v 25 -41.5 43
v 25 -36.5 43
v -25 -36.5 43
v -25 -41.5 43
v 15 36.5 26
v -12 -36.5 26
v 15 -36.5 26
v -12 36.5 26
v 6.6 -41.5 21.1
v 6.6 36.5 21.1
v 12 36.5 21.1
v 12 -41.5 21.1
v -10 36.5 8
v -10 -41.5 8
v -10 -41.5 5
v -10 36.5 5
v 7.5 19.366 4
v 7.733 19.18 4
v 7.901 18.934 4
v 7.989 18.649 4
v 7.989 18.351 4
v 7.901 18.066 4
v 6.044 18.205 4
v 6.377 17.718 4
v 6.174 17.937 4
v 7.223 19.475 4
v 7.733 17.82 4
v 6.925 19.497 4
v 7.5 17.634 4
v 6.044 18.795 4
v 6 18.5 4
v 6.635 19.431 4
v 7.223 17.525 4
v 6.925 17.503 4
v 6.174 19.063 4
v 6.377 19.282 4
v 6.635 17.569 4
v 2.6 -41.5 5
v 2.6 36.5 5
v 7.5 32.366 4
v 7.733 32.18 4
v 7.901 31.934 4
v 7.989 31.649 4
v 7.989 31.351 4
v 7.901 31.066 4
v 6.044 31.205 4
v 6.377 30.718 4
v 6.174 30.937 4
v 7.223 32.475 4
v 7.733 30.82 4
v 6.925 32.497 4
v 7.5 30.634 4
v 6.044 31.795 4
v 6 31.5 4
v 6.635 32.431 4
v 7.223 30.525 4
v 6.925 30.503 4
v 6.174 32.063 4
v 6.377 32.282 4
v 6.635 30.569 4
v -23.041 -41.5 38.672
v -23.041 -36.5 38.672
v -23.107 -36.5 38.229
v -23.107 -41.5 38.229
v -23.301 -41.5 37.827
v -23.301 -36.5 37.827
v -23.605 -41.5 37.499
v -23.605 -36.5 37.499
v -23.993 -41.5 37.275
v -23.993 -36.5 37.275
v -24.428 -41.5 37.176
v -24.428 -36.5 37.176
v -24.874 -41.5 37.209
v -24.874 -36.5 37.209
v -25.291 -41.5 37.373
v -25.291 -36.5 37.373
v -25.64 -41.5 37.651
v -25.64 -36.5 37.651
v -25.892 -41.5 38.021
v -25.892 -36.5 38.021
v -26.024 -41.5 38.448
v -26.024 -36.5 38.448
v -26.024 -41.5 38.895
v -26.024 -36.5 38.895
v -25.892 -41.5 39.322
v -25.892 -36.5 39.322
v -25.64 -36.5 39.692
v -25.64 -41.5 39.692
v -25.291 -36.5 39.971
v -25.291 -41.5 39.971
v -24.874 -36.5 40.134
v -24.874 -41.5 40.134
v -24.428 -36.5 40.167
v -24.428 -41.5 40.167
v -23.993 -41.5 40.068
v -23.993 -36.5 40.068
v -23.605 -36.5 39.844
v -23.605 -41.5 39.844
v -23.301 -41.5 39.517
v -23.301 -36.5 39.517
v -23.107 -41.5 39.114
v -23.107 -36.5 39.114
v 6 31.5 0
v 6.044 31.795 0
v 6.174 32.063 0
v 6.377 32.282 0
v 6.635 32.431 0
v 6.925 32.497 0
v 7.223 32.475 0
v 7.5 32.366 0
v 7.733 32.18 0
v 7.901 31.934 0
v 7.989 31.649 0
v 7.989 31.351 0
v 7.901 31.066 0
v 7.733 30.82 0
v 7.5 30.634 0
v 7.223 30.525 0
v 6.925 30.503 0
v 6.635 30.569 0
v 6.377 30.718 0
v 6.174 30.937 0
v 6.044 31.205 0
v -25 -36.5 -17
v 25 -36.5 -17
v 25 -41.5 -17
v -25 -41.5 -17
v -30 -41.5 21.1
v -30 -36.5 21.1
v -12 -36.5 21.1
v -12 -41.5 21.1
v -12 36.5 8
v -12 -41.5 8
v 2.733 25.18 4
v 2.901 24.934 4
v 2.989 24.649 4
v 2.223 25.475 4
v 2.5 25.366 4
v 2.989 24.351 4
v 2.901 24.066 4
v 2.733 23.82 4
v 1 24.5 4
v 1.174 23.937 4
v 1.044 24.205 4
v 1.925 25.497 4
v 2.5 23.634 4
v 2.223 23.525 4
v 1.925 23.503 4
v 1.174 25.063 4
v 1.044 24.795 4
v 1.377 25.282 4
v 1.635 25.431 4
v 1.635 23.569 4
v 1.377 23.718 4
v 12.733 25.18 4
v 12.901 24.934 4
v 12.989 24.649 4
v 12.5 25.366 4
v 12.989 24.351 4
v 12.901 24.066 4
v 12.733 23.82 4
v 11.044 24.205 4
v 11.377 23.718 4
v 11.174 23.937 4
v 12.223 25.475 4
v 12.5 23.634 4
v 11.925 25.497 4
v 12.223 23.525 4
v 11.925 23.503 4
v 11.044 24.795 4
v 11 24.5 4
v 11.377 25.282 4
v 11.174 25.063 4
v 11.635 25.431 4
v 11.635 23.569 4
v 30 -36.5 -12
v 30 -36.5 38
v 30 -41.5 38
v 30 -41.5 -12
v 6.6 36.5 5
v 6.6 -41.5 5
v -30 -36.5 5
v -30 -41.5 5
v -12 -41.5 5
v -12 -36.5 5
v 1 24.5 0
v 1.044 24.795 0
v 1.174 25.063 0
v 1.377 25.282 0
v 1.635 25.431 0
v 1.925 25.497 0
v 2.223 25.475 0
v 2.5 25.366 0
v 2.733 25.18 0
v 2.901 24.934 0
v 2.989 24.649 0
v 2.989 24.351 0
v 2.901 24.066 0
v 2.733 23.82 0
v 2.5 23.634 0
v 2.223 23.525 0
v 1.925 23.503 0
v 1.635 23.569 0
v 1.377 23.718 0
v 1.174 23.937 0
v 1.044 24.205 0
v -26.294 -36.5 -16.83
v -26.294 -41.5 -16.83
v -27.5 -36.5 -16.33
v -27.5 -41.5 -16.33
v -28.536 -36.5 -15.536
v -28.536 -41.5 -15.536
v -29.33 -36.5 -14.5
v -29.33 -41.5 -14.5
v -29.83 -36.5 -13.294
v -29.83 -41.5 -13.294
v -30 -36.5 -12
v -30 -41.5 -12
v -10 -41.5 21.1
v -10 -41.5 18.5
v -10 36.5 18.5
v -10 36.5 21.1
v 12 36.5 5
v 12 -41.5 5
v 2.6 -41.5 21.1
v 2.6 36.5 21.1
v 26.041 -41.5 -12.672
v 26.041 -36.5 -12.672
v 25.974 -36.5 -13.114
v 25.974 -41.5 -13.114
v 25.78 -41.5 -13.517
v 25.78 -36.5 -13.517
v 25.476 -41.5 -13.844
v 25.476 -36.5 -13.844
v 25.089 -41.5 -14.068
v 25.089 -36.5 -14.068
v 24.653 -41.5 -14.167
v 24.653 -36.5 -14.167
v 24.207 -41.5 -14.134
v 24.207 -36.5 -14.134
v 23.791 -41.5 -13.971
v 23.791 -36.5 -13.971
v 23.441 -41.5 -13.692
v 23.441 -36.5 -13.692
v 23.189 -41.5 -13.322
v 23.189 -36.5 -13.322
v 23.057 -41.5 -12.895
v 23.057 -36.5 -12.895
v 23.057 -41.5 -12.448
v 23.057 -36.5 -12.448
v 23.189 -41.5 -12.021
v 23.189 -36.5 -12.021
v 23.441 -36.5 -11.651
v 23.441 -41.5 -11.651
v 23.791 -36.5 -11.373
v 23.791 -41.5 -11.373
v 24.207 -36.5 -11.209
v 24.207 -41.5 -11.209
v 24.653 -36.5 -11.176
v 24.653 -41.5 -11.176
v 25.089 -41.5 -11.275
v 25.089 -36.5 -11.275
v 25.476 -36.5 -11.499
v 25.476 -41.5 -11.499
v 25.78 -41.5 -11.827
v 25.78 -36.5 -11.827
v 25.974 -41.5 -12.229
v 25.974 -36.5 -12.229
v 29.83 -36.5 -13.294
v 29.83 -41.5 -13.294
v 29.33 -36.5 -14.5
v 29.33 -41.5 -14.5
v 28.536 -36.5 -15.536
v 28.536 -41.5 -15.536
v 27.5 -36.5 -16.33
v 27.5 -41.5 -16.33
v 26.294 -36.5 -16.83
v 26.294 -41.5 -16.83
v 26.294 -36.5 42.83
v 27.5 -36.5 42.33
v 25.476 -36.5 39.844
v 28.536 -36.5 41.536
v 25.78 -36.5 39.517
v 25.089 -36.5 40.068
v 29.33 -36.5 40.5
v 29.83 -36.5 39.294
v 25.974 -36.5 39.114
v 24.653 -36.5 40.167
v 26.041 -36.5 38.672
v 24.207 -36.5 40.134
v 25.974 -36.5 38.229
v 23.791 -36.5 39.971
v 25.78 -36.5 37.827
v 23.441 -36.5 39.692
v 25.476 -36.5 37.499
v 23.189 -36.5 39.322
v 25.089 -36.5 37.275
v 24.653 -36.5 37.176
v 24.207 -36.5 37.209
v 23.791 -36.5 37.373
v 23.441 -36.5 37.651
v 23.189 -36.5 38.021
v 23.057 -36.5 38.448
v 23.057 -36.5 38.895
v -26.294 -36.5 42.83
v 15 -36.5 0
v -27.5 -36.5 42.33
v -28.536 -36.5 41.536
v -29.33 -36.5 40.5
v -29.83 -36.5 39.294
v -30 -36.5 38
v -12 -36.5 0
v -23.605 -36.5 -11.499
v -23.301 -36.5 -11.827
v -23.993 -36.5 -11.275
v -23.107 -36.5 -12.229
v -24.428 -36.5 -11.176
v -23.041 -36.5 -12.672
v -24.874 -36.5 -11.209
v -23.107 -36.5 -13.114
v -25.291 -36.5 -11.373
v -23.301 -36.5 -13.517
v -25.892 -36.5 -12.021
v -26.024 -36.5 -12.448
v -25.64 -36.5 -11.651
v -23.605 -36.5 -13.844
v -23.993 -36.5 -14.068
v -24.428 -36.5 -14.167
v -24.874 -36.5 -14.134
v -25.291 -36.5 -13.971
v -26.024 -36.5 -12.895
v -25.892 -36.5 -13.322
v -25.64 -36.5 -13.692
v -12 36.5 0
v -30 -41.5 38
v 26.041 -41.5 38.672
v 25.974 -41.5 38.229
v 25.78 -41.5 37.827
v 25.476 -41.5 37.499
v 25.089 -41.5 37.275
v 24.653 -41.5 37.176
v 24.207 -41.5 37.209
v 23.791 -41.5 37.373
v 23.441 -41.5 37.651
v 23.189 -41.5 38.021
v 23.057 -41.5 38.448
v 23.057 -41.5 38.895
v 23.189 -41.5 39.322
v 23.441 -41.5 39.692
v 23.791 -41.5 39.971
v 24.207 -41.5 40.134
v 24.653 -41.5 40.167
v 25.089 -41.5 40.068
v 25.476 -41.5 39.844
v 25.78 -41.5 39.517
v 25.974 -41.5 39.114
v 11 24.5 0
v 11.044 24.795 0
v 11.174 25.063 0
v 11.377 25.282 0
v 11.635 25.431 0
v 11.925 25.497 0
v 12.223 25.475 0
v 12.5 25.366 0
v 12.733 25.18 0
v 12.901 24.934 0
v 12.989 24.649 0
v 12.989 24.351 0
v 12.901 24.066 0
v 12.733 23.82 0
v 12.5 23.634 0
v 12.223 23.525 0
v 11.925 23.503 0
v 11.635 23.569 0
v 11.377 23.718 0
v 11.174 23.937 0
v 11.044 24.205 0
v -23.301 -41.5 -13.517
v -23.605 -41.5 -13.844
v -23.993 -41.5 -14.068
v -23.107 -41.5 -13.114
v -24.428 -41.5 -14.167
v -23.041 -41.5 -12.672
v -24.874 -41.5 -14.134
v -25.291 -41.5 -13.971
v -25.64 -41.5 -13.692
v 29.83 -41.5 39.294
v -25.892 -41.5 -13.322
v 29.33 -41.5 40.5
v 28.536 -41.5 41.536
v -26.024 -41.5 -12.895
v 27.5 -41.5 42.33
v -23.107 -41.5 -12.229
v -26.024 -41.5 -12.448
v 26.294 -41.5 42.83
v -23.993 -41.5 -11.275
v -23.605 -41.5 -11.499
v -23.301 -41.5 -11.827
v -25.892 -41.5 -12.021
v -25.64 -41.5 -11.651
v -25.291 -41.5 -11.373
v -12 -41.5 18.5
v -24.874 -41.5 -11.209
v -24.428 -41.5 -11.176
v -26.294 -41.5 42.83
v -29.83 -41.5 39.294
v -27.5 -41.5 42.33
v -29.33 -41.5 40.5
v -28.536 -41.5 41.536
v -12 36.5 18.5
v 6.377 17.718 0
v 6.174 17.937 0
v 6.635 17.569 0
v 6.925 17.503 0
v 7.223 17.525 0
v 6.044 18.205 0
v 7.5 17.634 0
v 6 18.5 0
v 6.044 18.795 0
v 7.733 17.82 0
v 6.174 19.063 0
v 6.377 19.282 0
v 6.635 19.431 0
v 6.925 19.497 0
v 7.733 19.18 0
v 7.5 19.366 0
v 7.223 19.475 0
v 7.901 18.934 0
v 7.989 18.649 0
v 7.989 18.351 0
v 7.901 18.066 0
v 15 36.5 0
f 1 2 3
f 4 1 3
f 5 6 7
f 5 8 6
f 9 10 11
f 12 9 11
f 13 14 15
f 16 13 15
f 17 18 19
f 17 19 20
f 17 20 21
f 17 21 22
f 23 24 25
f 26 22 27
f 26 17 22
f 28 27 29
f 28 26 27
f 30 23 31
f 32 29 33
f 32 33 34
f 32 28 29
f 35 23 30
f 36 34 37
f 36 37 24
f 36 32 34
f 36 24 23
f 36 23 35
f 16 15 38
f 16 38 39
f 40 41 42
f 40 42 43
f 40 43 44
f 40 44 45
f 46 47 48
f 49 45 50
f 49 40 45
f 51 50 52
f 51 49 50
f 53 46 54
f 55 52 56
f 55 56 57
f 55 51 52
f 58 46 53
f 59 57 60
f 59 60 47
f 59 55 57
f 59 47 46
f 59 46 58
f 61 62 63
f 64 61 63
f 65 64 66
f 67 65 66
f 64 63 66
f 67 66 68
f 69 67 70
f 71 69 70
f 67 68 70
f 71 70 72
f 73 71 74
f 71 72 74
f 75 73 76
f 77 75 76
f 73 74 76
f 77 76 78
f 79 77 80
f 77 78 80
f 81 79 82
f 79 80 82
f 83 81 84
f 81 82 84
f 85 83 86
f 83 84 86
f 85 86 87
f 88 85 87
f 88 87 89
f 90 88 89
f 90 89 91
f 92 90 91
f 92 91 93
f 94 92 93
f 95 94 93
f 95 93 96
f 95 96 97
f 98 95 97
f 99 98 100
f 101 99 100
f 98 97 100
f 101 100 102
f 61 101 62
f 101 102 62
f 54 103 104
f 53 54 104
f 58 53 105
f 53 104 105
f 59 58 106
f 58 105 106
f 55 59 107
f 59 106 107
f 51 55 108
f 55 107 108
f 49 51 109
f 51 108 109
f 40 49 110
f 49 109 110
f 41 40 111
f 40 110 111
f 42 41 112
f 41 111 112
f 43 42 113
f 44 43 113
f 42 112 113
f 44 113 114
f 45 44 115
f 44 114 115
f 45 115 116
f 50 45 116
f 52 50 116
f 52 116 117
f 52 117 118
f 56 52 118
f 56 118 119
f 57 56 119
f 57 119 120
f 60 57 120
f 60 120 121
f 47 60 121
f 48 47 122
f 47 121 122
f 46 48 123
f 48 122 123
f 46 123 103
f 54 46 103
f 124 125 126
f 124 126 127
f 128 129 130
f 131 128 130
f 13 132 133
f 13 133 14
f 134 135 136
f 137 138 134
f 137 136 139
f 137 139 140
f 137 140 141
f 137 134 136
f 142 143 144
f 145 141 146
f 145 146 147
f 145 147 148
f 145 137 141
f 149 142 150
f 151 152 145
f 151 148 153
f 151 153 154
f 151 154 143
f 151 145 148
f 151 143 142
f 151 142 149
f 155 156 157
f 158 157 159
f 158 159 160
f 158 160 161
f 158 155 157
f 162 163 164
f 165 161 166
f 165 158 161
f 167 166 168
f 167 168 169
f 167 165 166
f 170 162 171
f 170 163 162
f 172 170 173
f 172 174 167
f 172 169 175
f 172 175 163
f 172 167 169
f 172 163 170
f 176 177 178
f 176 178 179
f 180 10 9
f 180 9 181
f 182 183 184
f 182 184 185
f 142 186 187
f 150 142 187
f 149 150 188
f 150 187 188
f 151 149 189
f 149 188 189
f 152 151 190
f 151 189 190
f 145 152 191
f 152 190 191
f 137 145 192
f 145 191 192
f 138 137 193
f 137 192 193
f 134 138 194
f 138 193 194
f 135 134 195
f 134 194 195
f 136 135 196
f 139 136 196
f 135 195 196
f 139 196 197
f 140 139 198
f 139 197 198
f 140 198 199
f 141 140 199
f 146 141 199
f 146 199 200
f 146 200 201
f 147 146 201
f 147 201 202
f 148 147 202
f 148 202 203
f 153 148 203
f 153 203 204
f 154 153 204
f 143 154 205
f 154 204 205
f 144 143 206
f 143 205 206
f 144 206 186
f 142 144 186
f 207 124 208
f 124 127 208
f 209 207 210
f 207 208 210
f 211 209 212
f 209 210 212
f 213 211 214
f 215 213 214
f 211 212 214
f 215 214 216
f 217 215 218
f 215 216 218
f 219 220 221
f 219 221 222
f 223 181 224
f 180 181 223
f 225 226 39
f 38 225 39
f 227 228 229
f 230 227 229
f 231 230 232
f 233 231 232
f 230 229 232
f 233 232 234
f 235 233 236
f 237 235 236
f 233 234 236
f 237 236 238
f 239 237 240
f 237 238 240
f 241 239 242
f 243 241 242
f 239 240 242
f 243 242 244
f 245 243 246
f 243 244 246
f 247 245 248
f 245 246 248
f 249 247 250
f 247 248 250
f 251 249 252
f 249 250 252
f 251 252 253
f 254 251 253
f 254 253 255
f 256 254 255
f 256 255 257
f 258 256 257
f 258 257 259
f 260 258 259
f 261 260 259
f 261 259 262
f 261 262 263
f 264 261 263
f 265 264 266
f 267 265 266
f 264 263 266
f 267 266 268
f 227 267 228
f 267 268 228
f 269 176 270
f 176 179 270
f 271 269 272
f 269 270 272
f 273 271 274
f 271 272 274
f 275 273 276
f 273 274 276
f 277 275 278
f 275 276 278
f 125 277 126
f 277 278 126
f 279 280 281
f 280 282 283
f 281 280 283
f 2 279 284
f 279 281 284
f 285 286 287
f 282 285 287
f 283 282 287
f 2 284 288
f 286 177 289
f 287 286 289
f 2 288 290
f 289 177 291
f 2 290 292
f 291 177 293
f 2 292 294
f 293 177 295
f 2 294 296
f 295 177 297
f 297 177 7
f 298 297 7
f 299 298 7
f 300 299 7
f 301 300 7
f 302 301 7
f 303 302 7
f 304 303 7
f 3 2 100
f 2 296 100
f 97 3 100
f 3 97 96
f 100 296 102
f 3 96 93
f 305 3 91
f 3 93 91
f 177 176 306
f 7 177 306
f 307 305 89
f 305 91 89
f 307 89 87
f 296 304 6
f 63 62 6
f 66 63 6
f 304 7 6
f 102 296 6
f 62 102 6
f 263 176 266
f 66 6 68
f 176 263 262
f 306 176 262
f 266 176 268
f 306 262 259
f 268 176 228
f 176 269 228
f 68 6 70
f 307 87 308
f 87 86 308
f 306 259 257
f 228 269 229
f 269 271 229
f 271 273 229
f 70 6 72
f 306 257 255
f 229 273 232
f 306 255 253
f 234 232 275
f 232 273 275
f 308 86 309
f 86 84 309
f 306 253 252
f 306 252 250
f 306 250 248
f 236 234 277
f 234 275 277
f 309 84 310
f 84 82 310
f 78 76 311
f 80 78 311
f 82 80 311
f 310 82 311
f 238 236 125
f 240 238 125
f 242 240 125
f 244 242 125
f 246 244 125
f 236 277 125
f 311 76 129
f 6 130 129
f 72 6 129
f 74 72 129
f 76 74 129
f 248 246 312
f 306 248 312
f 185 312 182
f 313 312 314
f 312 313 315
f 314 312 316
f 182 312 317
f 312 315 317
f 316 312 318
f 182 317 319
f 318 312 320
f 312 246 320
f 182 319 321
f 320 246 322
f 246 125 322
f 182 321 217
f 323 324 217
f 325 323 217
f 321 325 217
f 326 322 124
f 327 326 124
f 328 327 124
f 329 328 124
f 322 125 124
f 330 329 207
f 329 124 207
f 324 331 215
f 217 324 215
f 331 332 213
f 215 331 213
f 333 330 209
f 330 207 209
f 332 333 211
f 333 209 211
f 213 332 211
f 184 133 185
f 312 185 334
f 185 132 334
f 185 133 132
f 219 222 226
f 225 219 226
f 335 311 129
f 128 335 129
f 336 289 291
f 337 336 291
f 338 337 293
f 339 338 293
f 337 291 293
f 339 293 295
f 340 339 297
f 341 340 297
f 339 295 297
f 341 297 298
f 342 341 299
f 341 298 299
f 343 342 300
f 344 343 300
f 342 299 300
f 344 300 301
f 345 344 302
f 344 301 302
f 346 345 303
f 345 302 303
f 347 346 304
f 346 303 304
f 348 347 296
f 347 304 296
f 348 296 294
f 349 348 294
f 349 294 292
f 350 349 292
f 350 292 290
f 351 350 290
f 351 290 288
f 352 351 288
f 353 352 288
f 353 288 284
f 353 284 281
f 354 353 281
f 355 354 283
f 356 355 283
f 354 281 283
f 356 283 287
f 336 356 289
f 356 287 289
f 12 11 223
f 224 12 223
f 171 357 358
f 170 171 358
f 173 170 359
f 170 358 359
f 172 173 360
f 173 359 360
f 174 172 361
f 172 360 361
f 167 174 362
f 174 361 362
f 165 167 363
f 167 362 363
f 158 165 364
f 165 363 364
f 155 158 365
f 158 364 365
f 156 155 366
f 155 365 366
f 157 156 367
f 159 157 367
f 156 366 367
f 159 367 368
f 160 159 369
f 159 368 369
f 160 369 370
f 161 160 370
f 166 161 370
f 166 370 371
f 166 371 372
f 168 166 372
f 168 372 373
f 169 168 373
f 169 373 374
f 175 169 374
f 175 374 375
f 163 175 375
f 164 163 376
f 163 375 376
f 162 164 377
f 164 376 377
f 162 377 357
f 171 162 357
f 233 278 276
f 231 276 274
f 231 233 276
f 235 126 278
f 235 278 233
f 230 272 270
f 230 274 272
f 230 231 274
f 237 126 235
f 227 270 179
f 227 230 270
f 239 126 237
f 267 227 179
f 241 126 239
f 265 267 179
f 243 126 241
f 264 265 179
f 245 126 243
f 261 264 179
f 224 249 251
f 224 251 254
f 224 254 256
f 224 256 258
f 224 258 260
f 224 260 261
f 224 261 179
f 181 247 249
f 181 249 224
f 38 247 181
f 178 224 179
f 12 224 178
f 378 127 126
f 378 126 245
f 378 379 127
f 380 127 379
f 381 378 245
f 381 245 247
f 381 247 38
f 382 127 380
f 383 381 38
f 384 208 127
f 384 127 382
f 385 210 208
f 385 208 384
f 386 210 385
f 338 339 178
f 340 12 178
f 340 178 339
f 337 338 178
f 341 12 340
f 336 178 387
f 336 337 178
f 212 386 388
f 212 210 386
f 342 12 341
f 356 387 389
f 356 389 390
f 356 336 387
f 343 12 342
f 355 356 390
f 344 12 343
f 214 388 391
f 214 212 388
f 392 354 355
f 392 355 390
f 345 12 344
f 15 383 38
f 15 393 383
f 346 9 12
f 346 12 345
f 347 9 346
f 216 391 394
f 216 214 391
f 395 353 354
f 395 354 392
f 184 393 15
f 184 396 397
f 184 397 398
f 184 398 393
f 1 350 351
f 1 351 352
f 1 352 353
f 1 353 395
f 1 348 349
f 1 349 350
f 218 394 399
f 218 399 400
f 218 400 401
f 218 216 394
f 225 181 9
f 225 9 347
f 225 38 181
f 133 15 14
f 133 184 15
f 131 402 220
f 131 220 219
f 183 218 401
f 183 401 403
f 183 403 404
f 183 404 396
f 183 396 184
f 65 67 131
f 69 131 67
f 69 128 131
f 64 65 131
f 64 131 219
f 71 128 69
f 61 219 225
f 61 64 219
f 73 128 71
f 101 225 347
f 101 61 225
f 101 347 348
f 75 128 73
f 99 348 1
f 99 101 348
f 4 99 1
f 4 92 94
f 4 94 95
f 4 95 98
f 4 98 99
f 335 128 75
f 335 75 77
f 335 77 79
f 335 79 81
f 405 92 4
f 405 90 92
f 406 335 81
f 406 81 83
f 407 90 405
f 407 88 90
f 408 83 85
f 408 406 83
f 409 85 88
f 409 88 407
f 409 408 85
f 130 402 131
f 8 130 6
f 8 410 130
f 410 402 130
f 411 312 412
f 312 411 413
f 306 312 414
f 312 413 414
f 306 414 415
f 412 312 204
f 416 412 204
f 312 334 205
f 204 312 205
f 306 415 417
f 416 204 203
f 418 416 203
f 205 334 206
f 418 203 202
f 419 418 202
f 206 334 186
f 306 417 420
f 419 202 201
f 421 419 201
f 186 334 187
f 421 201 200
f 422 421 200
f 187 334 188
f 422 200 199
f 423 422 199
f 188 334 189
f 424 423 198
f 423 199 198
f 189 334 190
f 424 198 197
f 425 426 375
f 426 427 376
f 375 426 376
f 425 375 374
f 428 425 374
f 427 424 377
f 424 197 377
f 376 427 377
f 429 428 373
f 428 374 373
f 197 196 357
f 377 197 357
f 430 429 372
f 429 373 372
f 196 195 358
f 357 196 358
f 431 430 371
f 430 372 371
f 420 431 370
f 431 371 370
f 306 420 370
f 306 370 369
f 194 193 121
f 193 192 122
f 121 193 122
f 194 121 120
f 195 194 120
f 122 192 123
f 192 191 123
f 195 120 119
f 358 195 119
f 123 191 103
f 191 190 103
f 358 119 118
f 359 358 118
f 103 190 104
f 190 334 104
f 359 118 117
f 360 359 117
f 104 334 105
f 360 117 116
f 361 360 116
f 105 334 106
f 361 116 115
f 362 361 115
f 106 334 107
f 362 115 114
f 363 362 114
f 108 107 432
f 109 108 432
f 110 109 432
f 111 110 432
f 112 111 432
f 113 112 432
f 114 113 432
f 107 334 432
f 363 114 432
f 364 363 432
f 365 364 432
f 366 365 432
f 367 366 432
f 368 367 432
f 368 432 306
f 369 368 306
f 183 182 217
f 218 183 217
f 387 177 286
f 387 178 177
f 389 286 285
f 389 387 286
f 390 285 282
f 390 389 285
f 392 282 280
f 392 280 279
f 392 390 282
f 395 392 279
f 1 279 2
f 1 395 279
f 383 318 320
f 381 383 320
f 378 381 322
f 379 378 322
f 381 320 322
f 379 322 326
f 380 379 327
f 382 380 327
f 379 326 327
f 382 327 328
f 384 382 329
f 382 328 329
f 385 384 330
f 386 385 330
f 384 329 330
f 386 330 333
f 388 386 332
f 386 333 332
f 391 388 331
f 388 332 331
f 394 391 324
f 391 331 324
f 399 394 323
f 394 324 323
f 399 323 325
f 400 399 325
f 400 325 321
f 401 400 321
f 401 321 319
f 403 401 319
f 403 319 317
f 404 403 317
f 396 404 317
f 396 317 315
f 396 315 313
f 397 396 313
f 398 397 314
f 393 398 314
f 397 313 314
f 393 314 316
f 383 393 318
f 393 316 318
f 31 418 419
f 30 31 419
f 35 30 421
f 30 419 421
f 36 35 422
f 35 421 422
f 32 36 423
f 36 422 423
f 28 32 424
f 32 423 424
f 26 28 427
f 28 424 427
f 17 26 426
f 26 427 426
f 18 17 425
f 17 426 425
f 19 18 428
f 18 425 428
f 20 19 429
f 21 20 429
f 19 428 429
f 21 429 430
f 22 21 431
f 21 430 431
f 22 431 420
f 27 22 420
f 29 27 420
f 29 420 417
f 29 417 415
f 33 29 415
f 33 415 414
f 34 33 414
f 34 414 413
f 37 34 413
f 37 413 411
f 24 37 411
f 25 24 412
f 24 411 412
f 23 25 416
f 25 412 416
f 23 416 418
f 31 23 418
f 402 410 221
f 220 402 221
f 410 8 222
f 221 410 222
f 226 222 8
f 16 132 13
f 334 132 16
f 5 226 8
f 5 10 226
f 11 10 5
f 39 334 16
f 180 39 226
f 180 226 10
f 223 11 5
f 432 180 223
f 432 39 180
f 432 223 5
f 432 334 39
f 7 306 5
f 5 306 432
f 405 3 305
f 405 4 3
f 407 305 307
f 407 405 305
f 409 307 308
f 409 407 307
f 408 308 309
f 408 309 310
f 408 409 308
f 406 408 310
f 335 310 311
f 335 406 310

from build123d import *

# Parameters (mm, degrees)
SKETCH1_W           = 30
SKETCH1_H           = 73
BOSS_EXTRUDE1_DEPTH = 26
SKETCH2_W           = 25
SKETCH2_H           = 16.1
CUT_EXTRUDE1_DEPTH  = 74
SKETCH3_W           = 26
SKETCH3_H           = 24
SKETCH3_H_2         = 16.23422306
CUT_EXTRUDE2_DEPTH  = 5
SKETCH5_W           = 60
SKETCH5_H           = 60
BOSS_EXTRUDE2_DEPTH = 5
FILLET1_R           = 5
SKETCH6_R           = 1.5
CUT_EXTRUDE4_DEPTH  = 5
SKETCH7_R           = 1
CUT_EXTRUDE5_DEPTH  = 4
SKETCH8_W           = 15.5
SKETCH8_H           = 5
CUT_EXTRUDE6_DEPTH  = 42
SKETCH9_W           = 5
SKETCH9_H           = 26
CUT_EXTRUDE7_DEPTH  = 73
SKETCH10_W          = 2
SKETCH10_H          = 8
SKETCH10_H_2        = 7.5
BOSS_EXTRUDE3_DEPTH = 78
SKETCH11_W          = 42
SKETCH11_H          = 0.6
CUT_EXTRUDE8_DEPTH  = 6
SKETCH13_W          = 0.6
SKETCH13_H          = 5
BOSS_EXTRUDE5_DEPTH = 2
SKETCH15_W          = 4
SKETCH15_H          = 16.1
BOSS_EXTRUDE6_DEPTH = 78


with BuildPart() as part:
    # Sketch1 → Boss-Extrude1 (new body)
    with BuildSketch(Plane.XY):
        Rectangle(SKETCH1_W, SKETCH1_H)
    extrude(amount=BOSS_EXTRUDE1_DEPTH)

    # Sketch2 → Cut-Extrude1 (cut, through all)
    with BuildSketch(Plane(origin=(0, 36.5, 0), x_dir=(1, 0, 0), z_dir=(0, 1, 0))):
        with Locations((-0.5, -13.05)):
            Rectangle(SKETCH2_W, SKETCH2_H)
    extrude(amount=-CUT_EXTRUDE1_DEPTH, mode=Mode.SUBTRACT)

    # Sketch3 → Cut-Extrude2 (cut)
    with BuildSketch(Plane.ZY.offset(15)):
        with Locations((13, 21.5)):
            Rectangle(SKETCH3_W, SKETCH3_H)
        with Locations((13, -5.5)):
            Rectangle(SKETCH3_W, SKETCH3_H)
        with Locations((13, -28.61711153)):
            Rectangle(SKETCH3_W, SKETCH3_H_2)
    extrude(amount=-CUT_EXTRUDE2_DEPTH, mode=Mode.SUBTRACT)

    # Sketch5 → Boss-Extrude2 (add)
    with BuildSketch(Plane(origin=(0, -36.5, 0), x_dir=(-1, 0, 0), z_dir=(0, -1, 0))):
        with Locations((0, -13)):
            Rectangle(SKETCH5_W, SKETCH5_H)
    extrude(amount=BOSS_EXTRUDE2_DEPTH)

    # Fillet1
    fillet1_edges = [part.edges().sort_by_distance(p)[0] for p in [
        (30, -39, -17),
        (30, -39, 43),
        (-30, -39, 43),
        (-30, -39, -17),
    ]]
    fillet(fillet1_edges, radius=FILLET1_R)

    # Sketch6 → Cut-Extrude4 (cut)
    with BuildSketch(Plane(origin=(0, -36.5, 0), x_dir=(1, 0, 0), z_dir=(0, 1, 0))):
        with Locations((-24.540514854, 12.671548216)):
            Circle(SKETCH6_R)
        with Locations((24.540514854, 12.671548216)):
            Circle(SKETCH6_R)
        with Locations((-24.540514854, -38.671548216)):
            Circle(SKETCH6_R)
        with Locations((24.540514854, -38.671548216)):
            Circle(SKETCH6_R)
    extrude(amount=-CUT_EXTRUDE4_DEPTH, mode=Mode.SUBTRACT)

    # Sketch7 → Cut-Extrude5 (cut)
    with BuildSketch(Plane(origin=(0, 0, 0), x_dir=(-1, 0, 0), z_dir=(0, 0, -1))):
        with Locations((-7, 31.5)):
            Circle(SKETCH7_R)
        with Locations((-12, 24.5)):
            Circle(SKETCH7_R)
        with Locations((-2, 24.5)):
            Circle(SKETCH7_R)
        with Locations((-7, 18.5)):
            Circle(SKETCH7_R)
    extrude(amount=-CUT_EXTRUDE5_DEPTH, mode=Mode.SUBTRACT)

    # Sketch8 → Cut-Extrude6 (cut)
    with BuildSketch(Plane.ZY.offset(30)):
        with Locations((12.75, -39)):
            Rectangle(SKETCH8_W, SKETCH8_H)
    extrude(amount=-CUT_EXTRUDE6_DEPTH, mode=Mode.SUBTRACT)

    # Sketch9 → Cut-Extrude7 (cut)
    with BuildSketch(Plane(origin=(0, 36.5, 0), x_dir=(1, 0, 0), z_dir=(0, 1, 0))):
        with Locations((-12.5, -13)):
            Rectangle(SKETCH9_W, SKETCH9_H)
    extrude(amount=-CUT_EXTRUDE7_DEPTH, mode=Mode.SUBTRACT)

    # Sketch10 → Boss-Extrude3 (add)
    with BuildSketch(Plane(origin=(0, 36.5, 0), x_dir=(1, 0, 0), z_dir=(0, 1, 0))):
        with Locations((-11, -4)):
            Rectangle(SKETCH10_W, SKETCH10_H)
        with Locations((-11, -22.25)):
            Rectangle(SKETCH10_W, SKETCH10_H_2)
    extrude(amount=-BOSS_EXTRUDE3_DEPTH)

    # Sketch11 → Cut-Extrude8 (cut, through all)
    with BuildSketch(Plane(origin=(0, -36.5, 0), x_dir=(1, 0, 0), z_dir=(0, 1, 0))):
        with Locations((-9, -20.8)):
            Rectangle(SKETCH11_W, SKETCH11_H)
    extrude(amount=-CUT_EXTRUDE8_DEPTH, mode=Mode.SUBTRACT)

    # Sketch13 → Boss-Extrude5 (add)
    with BuildSketch(Plane.ZY.offset(12)):
        with Locations((20.8, -39)):
            Rectangle(SKETCH13_W, SKETCH13_H)
    extrude(amount=-BOSS_EXTRUDE5_DEPTH)

    # Sketch15 → Boss-Extrude6 (add)
    with BuildSketch(Plane(origin=(0, 36.5, 0), x_dir=(1, 0, 0), z_dir=(0, 1, 0))):
        with Locations((4.6, -13.05)):
            Rectangle(SKETCH15_W, SKETCH15_H)
    extrude(amount=-BOSS_EXTRUDE6_DEPTH)


solid = part.part
